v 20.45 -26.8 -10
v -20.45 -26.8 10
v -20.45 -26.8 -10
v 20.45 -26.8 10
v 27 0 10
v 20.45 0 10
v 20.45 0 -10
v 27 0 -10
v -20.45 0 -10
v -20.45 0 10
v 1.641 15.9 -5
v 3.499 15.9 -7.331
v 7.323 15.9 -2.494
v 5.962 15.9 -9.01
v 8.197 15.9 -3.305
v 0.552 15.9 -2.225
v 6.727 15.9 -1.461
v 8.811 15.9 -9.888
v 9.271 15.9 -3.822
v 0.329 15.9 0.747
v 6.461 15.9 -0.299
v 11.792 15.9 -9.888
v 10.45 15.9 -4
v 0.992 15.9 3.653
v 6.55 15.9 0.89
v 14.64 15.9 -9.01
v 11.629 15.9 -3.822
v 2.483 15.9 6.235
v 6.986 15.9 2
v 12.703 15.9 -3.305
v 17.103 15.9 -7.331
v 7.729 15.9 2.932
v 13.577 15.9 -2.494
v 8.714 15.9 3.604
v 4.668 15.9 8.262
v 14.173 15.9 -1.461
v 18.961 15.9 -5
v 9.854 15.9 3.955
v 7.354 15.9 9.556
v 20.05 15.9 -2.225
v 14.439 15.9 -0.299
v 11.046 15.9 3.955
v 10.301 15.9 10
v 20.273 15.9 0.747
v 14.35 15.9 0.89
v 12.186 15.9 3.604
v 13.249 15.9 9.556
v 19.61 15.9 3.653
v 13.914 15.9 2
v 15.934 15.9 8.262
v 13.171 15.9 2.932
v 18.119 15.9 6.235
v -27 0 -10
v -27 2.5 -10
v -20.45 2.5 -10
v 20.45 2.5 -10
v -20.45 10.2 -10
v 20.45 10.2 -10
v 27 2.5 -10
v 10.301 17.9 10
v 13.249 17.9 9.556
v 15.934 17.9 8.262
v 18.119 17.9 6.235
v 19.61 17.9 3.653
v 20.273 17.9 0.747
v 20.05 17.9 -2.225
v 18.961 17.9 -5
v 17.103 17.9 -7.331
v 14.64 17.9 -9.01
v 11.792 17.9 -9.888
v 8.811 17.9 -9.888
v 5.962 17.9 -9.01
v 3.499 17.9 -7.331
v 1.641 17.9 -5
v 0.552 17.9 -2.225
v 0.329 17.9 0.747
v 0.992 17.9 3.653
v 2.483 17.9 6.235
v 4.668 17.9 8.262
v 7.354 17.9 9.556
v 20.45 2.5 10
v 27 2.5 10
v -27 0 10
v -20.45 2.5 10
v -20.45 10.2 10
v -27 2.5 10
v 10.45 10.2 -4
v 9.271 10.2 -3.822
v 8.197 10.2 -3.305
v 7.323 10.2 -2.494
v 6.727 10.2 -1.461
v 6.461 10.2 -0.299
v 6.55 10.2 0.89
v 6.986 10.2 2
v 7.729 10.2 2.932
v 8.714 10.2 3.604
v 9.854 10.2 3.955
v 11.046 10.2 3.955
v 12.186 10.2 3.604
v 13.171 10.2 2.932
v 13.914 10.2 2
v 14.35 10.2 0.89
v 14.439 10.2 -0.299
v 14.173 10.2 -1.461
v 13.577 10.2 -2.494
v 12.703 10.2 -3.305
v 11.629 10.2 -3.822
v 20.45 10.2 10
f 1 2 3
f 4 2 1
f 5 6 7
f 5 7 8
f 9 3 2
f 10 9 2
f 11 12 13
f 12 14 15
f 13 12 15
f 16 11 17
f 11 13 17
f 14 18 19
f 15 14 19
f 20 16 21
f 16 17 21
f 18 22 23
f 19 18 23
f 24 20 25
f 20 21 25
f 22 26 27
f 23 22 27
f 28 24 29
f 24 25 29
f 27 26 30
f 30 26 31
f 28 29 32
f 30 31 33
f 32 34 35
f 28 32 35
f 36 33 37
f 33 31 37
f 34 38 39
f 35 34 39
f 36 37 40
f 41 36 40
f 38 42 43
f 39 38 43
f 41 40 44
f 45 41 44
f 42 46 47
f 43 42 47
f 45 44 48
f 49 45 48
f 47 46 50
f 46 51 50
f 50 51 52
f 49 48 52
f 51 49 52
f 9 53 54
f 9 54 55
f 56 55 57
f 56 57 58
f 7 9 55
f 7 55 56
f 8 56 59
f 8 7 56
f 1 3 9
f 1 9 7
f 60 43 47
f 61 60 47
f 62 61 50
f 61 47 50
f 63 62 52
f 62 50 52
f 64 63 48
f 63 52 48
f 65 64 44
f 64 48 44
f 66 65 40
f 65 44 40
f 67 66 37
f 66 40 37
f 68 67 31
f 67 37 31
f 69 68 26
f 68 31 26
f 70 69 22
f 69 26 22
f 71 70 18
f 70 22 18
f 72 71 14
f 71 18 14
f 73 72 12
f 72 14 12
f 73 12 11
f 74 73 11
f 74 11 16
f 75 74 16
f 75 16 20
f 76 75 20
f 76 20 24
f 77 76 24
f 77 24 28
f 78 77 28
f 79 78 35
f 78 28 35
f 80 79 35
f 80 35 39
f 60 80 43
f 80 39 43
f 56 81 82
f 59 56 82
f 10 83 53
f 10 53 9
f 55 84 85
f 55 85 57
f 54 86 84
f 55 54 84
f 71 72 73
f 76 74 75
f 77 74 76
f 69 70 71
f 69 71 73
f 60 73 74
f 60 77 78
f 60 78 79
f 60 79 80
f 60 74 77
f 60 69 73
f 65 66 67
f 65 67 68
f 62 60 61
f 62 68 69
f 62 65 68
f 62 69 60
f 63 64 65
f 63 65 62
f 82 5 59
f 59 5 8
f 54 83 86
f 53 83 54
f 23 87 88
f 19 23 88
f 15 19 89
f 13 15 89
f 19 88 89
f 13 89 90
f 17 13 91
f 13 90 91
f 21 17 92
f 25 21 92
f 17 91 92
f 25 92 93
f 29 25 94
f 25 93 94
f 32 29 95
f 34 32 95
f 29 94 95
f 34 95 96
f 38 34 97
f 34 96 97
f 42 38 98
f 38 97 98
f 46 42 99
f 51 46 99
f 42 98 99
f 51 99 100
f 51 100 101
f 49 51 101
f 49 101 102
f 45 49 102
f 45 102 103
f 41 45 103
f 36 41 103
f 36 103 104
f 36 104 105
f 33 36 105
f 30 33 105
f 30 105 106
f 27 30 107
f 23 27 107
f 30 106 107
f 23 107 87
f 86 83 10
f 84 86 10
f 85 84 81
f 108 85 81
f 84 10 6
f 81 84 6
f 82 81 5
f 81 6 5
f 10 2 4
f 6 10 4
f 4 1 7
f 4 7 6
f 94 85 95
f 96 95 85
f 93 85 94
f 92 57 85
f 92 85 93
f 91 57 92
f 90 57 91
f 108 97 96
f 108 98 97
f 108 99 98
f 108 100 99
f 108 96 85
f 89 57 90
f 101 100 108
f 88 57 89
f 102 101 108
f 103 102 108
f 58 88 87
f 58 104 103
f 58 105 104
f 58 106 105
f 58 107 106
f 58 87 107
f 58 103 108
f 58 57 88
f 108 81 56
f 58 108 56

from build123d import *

# Parameters (mm, degrees)
SKETCH2_W           = 54
SKETCH2_H           = 20
BOSS_EXTRUDE1_DEPTH = 2.5
SKETCH4_W           = 40.9
SKETCH4_H           = 20
BOSS_EXTRUDE2_DEPTH = 26.8
SKETCH5_W           = 40.9
SKETCH5_H           = 20
BOSS_EXTRUDE3_DEPTH = 7.7
SKETCH6_R           = 4
BOSS_EXTRUDE4_DEPTH = 5.7
SKETCH7_R           = 10
BOSS_EXTRUDE5_DEPTH = 2


with BuildPart() as part:
    # Sketch2 → Boss-Extrude1 (new body)
    with BuildSketch(Plane(origin=(0, 0, 0), x_dir=(1, 0, 0), z_dir=(0, 1, 0))):
        Rectangle(SKETCH2_W, SKETCH2_H)
    extrude(amount=BOSS_EXTRUDE1_DEPTH)

    # Sketch4 → Boss-Extrude2 (add)
    with BuildSketch(Plane.XZ):
        Rectangle(SKETCH4_W, SKETCH4_H)
    extrude(amount=BOSS_EXTRUDE2_DEPTH)

    # Sketch5 → Boss-Extrude3 (add)
    with BuildSketch(Plane(origin=(0, 2.5, 0), x_dir=(1, 0, 0), z_dir=(0, 1, 0))):
        Rectangle(SKETCH5_W, SKETCH5_H)
    extrude(amount=BOSS_EXTRUDE3_DEPTH)

    # Sketch6 → Boss-Extrude4 (add)
    with BuildSketch(Plane(origin=(0, 10.2, 0), x_dir=(1, 0, 0), z_dir=(0, 1, 0))):
        with Locations(Location((10.45, 0, 0), (0, 0, 90))):
            Circle(SKETCH6_R)
    extrude(amount=BOSS_EXTRUDE4_DEPTH)

    # Sketch7 → Boss-Extrude5 (add)
    with BuildSketch(Plane(origin=(0, 15.9, 0), x_dir=(1, 0, 0), z_dir=(0, 1, 0))):
        with Locations(Location((10.301103248, 0, 0), (0, 0, 270))):
            Circle(SKETCH7_R)
    extrude(amount=BOSS_EXTRUDE5_DEPTH)


solid = part.part
